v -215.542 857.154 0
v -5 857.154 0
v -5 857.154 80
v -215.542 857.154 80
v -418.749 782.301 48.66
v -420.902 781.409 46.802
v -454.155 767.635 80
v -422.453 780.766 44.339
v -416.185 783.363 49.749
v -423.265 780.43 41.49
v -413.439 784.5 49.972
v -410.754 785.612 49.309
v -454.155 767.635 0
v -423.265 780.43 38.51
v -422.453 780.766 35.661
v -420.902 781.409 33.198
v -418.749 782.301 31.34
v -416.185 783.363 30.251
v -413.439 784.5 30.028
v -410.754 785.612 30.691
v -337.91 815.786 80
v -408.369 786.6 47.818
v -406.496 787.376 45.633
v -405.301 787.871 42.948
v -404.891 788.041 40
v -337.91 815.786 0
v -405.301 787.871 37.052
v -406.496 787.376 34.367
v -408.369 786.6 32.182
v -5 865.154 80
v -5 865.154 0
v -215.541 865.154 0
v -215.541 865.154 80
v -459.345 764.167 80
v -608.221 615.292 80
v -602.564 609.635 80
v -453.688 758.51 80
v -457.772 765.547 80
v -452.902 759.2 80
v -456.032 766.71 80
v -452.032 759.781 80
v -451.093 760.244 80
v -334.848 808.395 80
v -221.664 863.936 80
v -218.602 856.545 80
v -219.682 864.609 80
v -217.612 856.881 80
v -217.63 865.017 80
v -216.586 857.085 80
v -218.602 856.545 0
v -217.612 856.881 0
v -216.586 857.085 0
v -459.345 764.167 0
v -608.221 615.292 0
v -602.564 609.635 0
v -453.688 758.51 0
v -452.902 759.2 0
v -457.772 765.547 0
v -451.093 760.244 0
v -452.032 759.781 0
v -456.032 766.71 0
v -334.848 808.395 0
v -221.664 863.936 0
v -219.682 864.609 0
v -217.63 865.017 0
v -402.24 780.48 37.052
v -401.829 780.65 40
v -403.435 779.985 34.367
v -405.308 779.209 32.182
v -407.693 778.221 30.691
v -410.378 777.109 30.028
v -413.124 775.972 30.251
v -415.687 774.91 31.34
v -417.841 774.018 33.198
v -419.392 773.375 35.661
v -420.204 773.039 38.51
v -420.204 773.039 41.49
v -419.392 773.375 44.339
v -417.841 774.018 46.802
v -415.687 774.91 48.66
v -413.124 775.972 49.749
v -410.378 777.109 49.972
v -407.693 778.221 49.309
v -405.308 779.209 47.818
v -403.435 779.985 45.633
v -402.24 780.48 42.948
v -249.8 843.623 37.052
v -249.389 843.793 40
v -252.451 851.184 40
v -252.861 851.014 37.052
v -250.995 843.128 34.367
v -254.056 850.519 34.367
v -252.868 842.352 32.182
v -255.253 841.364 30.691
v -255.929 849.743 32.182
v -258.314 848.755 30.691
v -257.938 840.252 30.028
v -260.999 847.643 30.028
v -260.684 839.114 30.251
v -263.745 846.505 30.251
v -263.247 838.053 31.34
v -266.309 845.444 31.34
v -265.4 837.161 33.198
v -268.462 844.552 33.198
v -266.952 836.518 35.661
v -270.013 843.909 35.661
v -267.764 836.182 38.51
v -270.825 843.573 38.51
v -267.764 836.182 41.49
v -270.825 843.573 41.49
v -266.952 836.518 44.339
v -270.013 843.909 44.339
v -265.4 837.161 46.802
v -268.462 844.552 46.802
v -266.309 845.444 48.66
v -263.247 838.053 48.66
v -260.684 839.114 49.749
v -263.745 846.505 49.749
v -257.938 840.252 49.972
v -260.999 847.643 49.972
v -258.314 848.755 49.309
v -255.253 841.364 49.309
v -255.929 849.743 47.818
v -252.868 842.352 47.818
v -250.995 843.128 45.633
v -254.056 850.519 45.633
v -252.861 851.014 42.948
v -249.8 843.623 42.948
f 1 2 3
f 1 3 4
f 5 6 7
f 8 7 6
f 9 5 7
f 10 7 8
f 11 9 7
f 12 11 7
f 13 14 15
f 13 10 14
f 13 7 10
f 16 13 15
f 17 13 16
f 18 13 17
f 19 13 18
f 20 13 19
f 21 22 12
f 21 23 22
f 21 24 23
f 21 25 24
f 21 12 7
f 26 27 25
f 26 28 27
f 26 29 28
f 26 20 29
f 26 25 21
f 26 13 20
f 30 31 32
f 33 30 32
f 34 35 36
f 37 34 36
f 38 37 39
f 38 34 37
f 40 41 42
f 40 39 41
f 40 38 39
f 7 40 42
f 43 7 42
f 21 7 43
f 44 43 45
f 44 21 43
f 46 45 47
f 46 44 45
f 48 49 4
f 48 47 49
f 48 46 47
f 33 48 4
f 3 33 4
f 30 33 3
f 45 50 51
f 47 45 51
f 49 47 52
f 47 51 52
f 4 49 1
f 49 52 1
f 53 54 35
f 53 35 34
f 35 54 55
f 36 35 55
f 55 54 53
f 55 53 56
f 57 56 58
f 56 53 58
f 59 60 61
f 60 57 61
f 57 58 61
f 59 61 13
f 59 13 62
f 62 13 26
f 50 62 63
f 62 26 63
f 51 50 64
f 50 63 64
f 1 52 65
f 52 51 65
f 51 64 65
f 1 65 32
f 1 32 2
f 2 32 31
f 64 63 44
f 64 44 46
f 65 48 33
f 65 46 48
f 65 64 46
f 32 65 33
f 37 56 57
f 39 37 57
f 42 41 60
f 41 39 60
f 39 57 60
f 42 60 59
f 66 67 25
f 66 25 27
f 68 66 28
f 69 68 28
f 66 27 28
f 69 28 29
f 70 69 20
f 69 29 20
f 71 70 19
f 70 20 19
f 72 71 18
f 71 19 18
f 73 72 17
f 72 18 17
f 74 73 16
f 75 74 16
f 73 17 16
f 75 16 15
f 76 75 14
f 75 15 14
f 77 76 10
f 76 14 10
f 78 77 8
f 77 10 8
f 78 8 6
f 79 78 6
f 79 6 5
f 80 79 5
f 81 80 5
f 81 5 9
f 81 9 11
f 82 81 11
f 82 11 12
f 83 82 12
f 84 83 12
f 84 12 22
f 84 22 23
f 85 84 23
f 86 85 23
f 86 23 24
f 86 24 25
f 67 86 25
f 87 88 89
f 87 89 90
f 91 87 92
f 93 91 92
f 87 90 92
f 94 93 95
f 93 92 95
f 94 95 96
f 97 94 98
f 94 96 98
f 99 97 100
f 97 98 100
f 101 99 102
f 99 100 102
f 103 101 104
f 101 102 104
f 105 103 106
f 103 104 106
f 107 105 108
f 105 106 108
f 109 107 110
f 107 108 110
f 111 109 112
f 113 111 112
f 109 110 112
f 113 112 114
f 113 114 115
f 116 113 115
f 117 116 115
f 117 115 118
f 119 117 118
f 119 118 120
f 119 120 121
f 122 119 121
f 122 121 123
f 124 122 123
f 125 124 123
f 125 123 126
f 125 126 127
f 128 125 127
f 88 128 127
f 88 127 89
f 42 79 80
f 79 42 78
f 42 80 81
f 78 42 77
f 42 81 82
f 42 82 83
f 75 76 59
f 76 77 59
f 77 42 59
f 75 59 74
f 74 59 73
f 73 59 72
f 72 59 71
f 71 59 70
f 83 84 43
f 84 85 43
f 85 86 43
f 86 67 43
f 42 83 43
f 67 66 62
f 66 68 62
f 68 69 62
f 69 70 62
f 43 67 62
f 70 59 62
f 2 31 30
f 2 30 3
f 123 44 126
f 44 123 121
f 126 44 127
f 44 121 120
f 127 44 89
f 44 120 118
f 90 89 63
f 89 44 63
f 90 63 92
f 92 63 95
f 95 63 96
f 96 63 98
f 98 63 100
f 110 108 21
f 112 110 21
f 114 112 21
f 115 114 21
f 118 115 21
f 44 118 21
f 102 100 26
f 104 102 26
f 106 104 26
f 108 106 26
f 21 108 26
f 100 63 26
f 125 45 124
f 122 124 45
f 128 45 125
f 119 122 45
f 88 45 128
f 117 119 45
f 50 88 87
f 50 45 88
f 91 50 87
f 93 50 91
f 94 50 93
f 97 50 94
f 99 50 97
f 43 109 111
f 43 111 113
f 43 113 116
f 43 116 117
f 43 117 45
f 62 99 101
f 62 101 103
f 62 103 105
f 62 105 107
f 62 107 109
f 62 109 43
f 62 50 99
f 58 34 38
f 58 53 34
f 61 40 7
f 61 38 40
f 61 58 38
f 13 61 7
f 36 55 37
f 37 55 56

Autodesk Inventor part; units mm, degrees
ref_plane "YZ Plane" through (0, 0, 0) normal (1, 0, 0) x (0, 1, 0)
ref_plane "XZ Plane" through (0, 0, 0) normal (0, 1, 0) x (-1, 0, 0)
ref_plane "XY Plane" through (0, 0, 0) normal (0, 0, 1) x (1, 0, 0)
sketch "Sketch2" plane through (0, 0, 0) normal (0, 0, 1) x (1, 0, 0)
  line L0 (0, 273.8452) -> (193.6378, 193.6378) construction
  line L1 (193.6378, 193.6378) -> (273.8452, 0) construction
  line L2 (273.8452, 0) -> (193.6378, -193.6378) construction
  line L3 (193.6378, -193.6378) -> (0, -273.8452) construction
  line L4 (0, -273.8452) -> (-193.6378, -193.6378) construction
  line L5 (-193.6378, -193.6378) -> (-273.8452, 0) construction
  line L6 (-273.8452, 0) -> (-193.6378, 193.6378) construction
  line L7 (-193.6378, 193.6378) -> (0, 273.8452) construction
  line L8 (-193.6378, 193.6378) -> (0, 273.8452) construction
  line L9 (-459.9272, 770.6562) -> (-219.7185, 870.1539) construction
  line L10 (-96.8189, 233.7415) -> (-339.8229, 820.405) construction
  line L11 (-219.7185, 870.1539) -> (0, 870.1539) construction
  line L12 (0, 870.1539) -> (0, 273.8452) construction
  line L13 (-459.9272, 770.6562) -> (-615.2917, 615.2917) construction
  line L14 (-615.2917, 615.2917) -> (-193.6378, 193.6378) construction
  line L15 (-221.6643, 863.9359) -> (-337.9095, 815.7856)
  line L16 (-5, 865.1539) -> (-215.5414, 865.1539)
  line L17 (-454.1546, 767.6353) -> (-337.9095, 815.7856)
  line L18 (-608.2206, 615.2917) -> (-459.3454, 764.1669)
  arc A0 (-215.5414, 865.1539) -> (-221.6643, 863.9359) centre (-215.5414, 849.1539) ccw
  arc A1 (-454.1546, 767.6353) -> (-459.3454, 764.1669) centre (-448.0317, 752.8532) ccw
  point P0 (0, 0)
  point P1 (0, 0)
  point P2 (0, 0)
  point P3 (-218.724, 865.1539)
  point P4 (-457.095, 766.4174)
  dimension "d0" = 506
  dimension "d1" = 260
  dimension "d2" = 635
  dimension "d6" = 5
  dimension "d10" = 5
  dimension "d14" = 5
  dimension "d15" = 16
contour flange "Contour Flange1" sketch "Sketch2" thickness 8 bend radius 8 width 80 along (0, 0, 1) mid plane no both sides no wall seen from (-110.2707, 865.1539, 0) lies toward (0, -1, 0) curves L16 A0 L15 L17 A1 L18
bend "Bend1"
corner "Corner1"
sketch "Sketch3" plane through (-454.1546, 767.6353, 80) normal (-0.3826834, 0.9238795, 0) x (0.9238795, 0.3826834, 0)
  line L0 (125.8228, 80) -> (125.8228, 0) construction
  line L1 (0, 0) -> (251.6457, 0) projected
  circle A0 centre (43.3228, 40) radius 10
  circle A1 centre (208.3228, 40) radius 10
  point P0 (125.8228, 40)
  dimension "d27" = 20
  dimension "d28" = 82.5
extrude "Extrusion1" cut sketch "Sketch3" against normal up to surface (8 mm away)
equation "\"d0\" = Барабан_габарит_по_кассетам"
equation "\"d1\" = Кассета_длина_грани"
equation "\"d2\" = Кассета_высота"
equation "\"d10\" = d6"
equation "\"d15\" = BendRadius + Thickness"
equation "\"d16\" = Thickness"
equation "\"d17\" = BendReliefWidth"
equation "\"d18\" = BendReliefDepth"
equation "\"d19\" = MinimumRemnant"
equation "\"d20\" = TransitionRadius"
equation "\"d22\" = BendRadius"
equation "\"d24\" = CornerReliefSize"
equation "\"d25\" = GapSize"
equation "\"d26\" = JacobiRadiusSize"
equation "\"BendRadius\" = Thickness"
equation "\"BendReliefWidth\" = Thickness"
equation "\"BendReliefDepth\" = 0.5 * Thickness"
equation "\"CornerReliefSize\" = 4 * Thickness"
equation "\"MinimumRemnant\" = 2 * Thickness"
equation "\"TransitionRadius\" = BendRadius"
equation "\"JacobiRadiusSize\" = BendRadius"
equation "\"GapSize\" = Thickness"
equation "\"Барабан_габарит_по_кассетам\" = 506"
equation "\"Кассета_длина_грани\" = 260"
equation "\"Кассета_высота\" = 635"
equation "\"Thickness\" = 8"
properties part number "ДМФ 0122 Верхний лист"
